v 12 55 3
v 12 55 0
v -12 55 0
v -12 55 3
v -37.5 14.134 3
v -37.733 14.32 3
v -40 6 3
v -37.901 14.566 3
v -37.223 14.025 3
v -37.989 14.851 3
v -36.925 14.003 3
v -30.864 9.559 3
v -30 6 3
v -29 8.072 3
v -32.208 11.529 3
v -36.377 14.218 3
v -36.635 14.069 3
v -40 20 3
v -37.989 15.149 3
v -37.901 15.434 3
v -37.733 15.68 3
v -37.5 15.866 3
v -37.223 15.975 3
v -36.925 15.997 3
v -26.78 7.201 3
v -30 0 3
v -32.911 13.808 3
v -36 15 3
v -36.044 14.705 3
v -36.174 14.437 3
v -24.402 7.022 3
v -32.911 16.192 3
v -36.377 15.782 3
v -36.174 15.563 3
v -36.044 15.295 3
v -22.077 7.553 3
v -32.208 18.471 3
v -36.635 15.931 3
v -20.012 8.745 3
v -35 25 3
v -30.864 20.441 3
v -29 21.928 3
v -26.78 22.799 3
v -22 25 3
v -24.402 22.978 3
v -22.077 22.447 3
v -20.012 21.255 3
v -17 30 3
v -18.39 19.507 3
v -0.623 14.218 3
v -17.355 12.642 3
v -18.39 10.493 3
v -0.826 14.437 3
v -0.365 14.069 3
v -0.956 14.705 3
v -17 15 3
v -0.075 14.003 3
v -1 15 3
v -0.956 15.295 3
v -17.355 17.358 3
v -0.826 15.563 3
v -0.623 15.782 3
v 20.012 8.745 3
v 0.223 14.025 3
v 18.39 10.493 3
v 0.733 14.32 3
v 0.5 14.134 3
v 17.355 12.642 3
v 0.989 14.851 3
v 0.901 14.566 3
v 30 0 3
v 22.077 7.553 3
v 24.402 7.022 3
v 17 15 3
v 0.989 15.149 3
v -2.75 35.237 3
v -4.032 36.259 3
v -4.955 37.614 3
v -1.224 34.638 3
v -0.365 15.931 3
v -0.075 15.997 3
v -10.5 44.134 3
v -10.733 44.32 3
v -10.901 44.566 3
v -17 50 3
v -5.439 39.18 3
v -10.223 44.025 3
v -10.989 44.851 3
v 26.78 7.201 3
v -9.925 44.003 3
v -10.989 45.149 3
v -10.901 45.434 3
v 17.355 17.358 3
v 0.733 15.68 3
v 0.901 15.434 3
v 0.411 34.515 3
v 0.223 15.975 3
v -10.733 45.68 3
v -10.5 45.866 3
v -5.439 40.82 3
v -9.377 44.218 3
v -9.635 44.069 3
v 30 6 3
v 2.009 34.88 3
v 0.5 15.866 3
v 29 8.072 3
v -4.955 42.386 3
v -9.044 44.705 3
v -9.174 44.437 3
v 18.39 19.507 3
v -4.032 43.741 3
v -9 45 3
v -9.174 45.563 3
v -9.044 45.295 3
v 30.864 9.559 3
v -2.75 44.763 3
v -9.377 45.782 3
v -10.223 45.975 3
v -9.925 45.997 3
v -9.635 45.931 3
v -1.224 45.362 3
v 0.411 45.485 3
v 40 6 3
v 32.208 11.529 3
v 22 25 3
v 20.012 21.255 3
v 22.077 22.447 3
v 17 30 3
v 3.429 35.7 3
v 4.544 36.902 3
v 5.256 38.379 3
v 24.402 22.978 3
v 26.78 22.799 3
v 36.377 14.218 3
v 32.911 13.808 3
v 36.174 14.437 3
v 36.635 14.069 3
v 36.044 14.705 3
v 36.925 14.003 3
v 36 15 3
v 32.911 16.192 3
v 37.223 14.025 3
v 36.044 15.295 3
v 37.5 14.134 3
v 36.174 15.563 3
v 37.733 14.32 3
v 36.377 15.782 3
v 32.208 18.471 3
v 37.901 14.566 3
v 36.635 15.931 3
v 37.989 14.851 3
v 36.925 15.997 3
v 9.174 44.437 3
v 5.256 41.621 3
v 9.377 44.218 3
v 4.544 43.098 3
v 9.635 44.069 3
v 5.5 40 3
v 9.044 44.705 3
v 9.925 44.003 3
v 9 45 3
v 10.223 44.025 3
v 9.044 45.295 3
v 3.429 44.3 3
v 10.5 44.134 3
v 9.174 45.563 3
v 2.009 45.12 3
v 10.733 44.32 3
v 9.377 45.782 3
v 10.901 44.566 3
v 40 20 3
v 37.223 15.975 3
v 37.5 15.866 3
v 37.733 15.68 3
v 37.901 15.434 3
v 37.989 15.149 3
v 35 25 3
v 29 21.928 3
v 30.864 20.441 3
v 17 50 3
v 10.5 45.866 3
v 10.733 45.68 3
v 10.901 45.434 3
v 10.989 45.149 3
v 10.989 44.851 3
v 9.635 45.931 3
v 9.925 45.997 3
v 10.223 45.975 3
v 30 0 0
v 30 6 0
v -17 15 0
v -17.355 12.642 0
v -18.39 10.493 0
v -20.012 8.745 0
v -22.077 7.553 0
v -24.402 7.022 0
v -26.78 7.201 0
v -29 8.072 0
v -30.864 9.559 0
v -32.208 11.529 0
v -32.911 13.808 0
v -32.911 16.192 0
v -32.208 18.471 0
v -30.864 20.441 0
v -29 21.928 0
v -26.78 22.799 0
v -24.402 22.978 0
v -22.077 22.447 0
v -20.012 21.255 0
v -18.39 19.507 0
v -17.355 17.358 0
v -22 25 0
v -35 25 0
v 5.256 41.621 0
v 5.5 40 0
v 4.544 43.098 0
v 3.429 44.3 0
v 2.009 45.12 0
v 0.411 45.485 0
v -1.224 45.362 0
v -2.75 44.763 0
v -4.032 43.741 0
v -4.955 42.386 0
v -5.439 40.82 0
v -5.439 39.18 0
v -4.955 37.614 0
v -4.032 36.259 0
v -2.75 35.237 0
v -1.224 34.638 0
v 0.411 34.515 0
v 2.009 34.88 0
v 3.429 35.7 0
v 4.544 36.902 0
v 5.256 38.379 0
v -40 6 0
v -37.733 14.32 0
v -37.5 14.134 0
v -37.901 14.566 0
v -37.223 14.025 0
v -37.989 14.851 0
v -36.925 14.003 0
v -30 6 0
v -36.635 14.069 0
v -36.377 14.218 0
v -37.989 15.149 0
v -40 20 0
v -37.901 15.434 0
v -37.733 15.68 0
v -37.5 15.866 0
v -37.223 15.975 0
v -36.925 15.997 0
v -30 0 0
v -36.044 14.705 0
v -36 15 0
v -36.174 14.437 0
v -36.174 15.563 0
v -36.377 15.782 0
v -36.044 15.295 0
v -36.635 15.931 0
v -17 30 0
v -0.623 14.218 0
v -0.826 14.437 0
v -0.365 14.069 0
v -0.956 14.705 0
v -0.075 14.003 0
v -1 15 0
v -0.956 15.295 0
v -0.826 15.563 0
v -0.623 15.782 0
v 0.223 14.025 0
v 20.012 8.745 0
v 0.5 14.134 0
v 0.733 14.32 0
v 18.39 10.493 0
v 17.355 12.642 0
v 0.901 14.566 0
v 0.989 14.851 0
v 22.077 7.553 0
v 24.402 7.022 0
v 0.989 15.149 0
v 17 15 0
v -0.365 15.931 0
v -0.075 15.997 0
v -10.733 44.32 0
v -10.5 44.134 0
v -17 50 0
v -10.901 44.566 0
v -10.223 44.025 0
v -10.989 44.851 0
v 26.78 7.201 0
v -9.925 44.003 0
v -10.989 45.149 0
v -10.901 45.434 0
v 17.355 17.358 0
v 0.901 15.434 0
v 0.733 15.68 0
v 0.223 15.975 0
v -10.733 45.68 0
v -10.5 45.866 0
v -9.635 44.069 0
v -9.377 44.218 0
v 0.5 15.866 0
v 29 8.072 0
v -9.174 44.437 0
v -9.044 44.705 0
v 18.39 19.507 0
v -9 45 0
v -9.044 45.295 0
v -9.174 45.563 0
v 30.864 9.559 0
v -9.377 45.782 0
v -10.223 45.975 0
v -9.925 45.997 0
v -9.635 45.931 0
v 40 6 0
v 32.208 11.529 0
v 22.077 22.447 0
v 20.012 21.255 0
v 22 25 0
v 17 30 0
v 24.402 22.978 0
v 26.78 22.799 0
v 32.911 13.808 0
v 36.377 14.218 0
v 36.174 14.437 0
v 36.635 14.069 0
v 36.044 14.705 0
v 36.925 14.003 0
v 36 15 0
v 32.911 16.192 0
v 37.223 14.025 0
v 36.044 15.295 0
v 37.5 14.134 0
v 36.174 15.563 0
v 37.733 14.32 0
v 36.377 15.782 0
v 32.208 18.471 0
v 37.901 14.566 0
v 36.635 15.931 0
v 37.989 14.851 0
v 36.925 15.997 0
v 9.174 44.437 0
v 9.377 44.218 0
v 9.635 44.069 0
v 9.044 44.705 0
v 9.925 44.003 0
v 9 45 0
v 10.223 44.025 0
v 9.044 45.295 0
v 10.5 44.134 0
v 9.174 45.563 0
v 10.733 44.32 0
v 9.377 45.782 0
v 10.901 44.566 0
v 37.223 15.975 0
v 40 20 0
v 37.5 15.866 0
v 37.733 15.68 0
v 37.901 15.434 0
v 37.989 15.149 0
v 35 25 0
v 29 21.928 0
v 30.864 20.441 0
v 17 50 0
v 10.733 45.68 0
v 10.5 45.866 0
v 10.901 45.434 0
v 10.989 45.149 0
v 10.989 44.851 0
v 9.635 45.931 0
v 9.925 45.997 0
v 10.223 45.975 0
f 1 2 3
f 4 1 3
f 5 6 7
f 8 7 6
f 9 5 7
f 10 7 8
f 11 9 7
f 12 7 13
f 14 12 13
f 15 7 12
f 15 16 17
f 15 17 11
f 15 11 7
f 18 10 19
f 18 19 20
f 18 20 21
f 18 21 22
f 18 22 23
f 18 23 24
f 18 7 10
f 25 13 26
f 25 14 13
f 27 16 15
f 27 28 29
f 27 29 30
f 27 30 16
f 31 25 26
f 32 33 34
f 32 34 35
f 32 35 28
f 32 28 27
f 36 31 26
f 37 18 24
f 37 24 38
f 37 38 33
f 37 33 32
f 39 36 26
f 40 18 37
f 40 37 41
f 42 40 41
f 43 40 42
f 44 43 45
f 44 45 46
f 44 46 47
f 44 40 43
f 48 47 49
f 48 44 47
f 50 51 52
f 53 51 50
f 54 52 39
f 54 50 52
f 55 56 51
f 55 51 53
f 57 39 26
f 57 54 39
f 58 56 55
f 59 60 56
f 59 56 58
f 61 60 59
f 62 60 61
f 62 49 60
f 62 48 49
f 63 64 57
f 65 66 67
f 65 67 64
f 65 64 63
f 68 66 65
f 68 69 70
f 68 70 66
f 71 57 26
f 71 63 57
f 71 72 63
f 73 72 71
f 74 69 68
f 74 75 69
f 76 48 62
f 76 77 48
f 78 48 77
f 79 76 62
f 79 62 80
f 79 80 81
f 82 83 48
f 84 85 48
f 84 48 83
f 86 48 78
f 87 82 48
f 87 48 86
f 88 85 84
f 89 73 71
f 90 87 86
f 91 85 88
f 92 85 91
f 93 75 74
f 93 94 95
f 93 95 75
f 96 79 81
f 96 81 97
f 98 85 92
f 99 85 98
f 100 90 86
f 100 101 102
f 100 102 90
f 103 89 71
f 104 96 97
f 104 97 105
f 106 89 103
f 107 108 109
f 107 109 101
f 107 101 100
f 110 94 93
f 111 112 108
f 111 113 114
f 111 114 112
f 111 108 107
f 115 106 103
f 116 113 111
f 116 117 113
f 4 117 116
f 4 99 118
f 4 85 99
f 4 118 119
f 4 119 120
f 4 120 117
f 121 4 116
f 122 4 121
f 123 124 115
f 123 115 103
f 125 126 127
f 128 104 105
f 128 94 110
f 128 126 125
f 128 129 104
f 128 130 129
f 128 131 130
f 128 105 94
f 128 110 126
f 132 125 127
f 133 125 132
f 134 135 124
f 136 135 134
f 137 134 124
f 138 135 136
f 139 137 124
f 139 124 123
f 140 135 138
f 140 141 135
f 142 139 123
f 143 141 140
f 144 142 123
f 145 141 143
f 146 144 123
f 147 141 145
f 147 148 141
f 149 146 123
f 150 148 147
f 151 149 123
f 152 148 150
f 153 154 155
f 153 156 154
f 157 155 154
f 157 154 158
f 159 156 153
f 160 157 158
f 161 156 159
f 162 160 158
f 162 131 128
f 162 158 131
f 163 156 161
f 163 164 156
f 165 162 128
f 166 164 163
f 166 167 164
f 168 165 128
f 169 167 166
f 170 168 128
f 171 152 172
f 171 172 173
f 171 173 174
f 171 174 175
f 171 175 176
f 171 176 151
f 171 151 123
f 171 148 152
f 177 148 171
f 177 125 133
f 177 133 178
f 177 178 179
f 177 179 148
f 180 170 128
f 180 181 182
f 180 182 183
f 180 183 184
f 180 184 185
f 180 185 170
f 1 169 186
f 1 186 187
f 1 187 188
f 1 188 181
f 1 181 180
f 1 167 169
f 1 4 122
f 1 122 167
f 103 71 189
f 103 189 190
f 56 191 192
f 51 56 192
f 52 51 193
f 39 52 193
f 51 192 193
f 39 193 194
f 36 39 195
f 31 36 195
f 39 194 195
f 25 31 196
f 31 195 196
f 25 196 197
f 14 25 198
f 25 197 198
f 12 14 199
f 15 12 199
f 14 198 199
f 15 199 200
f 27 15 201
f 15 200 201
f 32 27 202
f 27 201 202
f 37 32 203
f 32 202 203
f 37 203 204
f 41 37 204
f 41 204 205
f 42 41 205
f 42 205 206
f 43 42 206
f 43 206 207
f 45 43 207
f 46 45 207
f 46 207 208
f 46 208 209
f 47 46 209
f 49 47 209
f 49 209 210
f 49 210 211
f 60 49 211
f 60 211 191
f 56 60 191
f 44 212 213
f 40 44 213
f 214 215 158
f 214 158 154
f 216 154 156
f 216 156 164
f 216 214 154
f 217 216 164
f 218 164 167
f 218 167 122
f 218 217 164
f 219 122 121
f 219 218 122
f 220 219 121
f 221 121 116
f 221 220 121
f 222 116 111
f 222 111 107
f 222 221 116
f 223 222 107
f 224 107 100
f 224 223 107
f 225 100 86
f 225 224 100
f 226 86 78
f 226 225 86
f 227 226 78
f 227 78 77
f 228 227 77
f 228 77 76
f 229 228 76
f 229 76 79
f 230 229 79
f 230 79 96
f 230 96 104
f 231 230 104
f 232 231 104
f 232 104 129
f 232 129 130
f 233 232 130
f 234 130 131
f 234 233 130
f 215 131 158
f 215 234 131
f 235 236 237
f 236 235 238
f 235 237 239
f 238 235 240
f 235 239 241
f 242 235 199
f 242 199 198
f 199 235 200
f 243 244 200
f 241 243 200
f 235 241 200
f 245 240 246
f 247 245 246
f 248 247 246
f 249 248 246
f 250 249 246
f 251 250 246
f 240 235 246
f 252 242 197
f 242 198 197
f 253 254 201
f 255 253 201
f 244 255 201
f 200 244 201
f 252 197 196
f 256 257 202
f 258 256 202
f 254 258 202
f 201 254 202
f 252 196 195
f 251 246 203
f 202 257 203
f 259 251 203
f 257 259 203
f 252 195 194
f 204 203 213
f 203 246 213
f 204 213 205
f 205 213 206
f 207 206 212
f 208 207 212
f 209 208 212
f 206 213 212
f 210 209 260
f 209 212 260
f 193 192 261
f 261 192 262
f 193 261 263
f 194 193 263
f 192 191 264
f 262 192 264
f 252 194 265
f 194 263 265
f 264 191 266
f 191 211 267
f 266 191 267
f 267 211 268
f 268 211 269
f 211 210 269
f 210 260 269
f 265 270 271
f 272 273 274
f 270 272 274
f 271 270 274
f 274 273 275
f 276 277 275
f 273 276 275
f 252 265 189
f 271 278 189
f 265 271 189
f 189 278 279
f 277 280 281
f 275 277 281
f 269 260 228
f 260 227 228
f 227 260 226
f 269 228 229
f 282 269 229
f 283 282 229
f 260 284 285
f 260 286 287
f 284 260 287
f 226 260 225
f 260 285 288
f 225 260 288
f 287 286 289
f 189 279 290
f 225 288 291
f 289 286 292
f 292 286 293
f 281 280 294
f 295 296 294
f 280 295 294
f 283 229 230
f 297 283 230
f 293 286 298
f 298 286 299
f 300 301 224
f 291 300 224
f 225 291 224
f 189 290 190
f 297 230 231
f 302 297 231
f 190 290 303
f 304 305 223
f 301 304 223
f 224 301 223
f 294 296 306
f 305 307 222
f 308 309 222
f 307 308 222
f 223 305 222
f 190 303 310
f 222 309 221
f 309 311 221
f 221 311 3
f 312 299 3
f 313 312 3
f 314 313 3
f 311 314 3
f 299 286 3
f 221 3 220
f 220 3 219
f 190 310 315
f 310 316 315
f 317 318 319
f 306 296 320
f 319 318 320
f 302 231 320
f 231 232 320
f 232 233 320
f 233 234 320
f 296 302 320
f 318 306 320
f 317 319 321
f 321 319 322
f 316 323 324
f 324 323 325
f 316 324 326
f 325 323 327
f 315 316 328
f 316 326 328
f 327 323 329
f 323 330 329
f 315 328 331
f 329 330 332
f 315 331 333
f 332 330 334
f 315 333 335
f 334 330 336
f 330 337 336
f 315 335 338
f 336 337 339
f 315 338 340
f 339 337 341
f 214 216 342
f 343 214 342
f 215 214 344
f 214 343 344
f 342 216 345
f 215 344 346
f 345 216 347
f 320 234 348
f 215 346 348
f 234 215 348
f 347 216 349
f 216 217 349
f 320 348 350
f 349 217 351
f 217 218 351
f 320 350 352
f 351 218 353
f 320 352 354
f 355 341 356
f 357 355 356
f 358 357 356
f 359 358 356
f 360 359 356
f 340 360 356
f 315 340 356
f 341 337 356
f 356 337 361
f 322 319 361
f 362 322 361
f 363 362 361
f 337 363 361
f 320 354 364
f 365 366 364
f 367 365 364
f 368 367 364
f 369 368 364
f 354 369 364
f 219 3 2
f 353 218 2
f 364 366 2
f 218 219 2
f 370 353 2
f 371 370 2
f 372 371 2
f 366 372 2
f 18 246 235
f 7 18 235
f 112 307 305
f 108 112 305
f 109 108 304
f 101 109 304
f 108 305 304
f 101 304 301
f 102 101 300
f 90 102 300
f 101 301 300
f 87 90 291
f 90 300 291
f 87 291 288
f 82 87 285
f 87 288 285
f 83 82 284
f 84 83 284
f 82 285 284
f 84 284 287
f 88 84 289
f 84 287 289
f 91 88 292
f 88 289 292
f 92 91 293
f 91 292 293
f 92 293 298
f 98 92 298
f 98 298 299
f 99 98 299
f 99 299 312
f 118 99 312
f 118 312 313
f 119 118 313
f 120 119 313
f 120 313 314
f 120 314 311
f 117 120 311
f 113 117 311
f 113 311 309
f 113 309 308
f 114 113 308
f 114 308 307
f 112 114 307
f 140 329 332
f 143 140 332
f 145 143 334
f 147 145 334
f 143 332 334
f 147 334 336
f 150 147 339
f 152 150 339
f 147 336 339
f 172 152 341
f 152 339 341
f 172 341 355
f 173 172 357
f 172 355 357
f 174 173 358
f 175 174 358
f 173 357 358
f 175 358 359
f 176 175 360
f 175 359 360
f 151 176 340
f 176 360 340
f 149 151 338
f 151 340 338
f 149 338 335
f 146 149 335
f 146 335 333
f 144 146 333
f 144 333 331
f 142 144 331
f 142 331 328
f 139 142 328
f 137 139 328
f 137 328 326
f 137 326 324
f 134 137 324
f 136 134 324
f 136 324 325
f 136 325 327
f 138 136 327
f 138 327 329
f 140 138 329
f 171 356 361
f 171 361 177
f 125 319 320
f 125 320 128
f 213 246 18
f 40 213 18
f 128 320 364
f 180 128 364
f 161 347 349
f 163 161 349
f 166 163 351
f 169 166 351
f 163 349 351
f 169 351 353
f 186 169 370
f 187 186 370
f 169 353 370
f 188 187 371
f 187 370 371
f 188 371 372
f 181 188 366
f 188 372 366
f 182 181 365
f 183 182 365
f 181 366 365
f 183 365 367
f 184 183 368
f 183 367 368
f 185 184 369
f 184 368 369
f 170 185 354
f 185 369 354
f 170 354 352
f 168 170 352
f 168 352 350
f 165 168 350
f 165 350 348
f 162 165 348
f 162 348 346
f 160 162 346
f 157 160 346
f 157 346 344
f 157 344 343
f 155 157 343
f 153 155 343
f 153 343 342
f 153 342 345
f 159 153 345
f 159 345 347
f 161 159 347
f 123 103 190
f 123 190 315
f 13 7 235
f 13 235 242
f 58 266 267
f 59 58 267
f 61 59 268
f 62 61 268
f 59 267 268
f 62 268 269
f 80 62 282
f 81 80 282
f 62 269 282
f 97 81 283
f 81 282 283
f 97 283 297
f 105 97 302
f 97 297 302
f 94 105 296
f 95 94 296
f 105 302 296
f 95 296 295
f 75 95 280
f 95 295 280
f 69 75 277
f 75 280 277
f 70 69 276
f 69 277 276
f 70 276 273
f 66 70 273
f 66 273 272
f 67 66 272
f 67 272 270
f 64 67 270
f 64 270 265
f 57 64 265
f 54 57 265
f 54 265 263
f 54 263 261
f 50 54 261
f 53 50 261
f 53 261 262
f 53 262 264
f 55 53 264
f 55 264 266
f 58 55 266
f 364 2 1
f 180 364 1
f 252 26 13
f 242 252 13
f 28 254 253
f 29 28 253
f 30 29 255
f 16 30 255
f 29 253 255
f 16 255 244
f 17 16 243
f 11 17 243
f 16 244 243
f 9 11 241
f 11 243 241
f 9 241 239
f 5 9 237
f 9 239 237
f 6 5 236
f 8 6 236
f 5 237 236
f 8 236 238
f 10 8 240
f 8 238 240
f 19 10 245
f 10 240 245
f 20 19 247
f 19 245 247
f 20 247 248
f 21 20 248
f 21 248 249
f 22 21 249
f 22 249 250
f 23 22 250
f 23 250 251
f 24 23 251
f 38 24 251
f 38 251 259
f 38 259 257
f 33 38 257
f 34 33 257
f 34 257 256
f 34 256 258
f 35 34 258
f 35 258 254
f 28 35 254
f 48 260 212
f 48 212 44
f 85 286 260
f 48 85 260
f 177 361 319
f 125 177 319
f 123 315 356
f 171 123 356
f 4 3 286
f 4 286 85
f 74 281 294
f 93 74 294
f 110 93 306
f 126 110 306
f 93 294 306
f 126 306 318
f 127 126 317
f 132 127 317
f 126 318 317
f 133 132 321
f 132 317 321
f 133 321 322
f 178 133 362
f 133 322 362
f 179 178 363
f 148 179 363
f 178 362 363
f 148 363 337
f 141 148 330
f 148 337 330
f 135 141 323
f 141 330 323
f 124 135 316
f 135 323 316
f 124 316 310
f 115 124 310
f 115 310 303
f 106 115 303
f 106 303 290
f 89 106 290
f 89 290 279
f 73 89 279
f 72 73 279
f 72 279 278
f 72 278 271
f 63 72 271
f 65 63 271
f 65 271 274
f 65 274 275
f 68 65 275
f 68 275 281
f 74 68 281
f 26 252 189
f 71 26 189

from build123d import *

# Parameters (mm, degrees)
ESQUISSE1_R             = 13
BOSS_EXTRU_1_DEPTH      = 12
BOSS_EXTRU_2_START      = -12
ESQUISSE2_R             = 13
ESQUISSE2_R_2           = 5.5
BOSS_EXTRU_2_DEPTH      = 3
ESQUISSE4_R             = 8
ENL_V_MAT_EXTRU_2_DEPTH = 6
ESQUISSE5_R             = 3
ENL_V_MAT_EXTRU_3_DEPTH = 69.271516755
ESQUISSE6_W             = 10
ESQUISSE6_H             = 6
ENL_V_MAT_EXTRU_4_DEPTH = 12
CHANFREIN1_SIZE         = 5
ESQUISSE7_R             = 1
ENL_V_MAT_EXTRU_5_DEPTH = 12
ESQUISSE8_W             = 80
ESQUISSE8_H             = 9
ENL_V_MAT_EXTRU_6_DEPTH = 70.057946682


with BuildPart() as part:
    # Esquisse1 → Boss.-Extru.1 (new body)
    with BuildSketch(Plane.XY):
        Polygon((-40, 0), (40, 0), (40, 25), (17, 25), (17, 55), (-17, 55), (-17, 25), (-40, 25), align=None)
        with Locations((0, 40)):
            Circle(ESQUISSE1_R, mode=Mode.SUBTRACT)
    extrude(amount=BOSS_EXTRU_1_DEPTH)

    # Esquisse2 → Boss.-Extru.2 (add)
    with BuildSketch(Plane.XY.offset(12).offset(BOSS_EXTRU_2_START)):
        with Locations((0, 40)):
            Circle(ESQUISSE2_R)
        with Locations((0, 40)):
            Circle(ESQUISSE2_R_2, mode=Mode.SUBTRACT)
    extrude(amount=BOSS_EXTRU_2_DEPTH)

    # Esquisse4 → Enlèv. mat.-Extru.2 (cut)
    with BuildSketch(Plane(origin=(0, 0, 0), x_dir=(-1, 0, 0), z_dir=(0, 0, -1))):
        with Locations((-25, 15)):
            Circle(ESQUISSE4_R)
        with Locations(Location((25, 15, 0), (0, 0, 180))):
            Circle(ESQUISSE4_R)
    extrude(amount=-ENL_V_MAT_EXTRU_2_DEPTH, mode=Mode.SUBTRACT)

    # Esquisse5 → Enlèv. mat.-Extru.3 (cut, through all)
    with BuildSketch(Plane(origin=(0, 0, 6), x_dir=(-1, 0, 0), z_dir=(0, 0, -1))):
        with Locations((-25, 15)):
            Circle(ESQUISSE5_R)
        with Locations(Location((25, 15, 0), (0, 0, 180))):
            Circle(ESQUISSE5_R)
    extrude(amount=-ENL_V_MAT_EXTRU_3_DEPTH, mode=Mode.SUBTRACT)

    # Esquisse6 → Enlèv. mat.-Extru.4 (cut)
    with BuildSketch(Plane.XY.offset(12)):
        with Locations((35, 3)):
            Rectangle(ESQUISSE6_W, ESQUISSE6_H)
        with Locations((-35, 3)):
            Rectangle(ESQUISSE6_W, ESQUISSE6_H)
    extrude(amount=-ENL_V_MAT_EXTRU_4_DEPTH, mode=Mode.SUBTRACT)

    # Chanfrein1
    chanfrein1_edges = [part.edges().sort_by_distance(p)[0] for p in [
        (-17, 55, 6),
        (17, 55, 6),
        (17, 25, 6),
        (40, 25, 6),
        (-40, 25, 6),
        (-17, 25, 6),
    ]]
    chamfer(chanfrein1_edges, length=CHANFREIN1_SIZE)

    # Esquisse7 → Enlèv. mat.-Extru.5 (cut)
    with BuildSketch(Plane(origin=(0, 0, 0), x_dir=(-1, 0, 0), z_dir=(0, 0, -1))):
        with Locations((-10, 45)):
            Circle(ESQUISSE7_R)
        with Locations(Location((10, 45, 0), (0, 0, 180))):
            Circle(ESQUISSE7_R)
        with Locations((-37, 15)):
            Circle(ESQUISSE7_R)
        with Locations(Location((37, 15, 0), (0, 0, 180))):
            Circle(ESQUISSE7_R)
        with Locations((0, 15)):
            Circle(ESQUISSE7_R)
    extrude(amount=-ENL_V_MAT_EXTRU_5_DEPTH, mode=Mode.SUBTRACT)

    # Esquisse8 → Enlèv. mat.-Extru.6 (cut, through all)
    with BuildSketch(Plane(origin=(0, 55, 0), x_dir=(1, 0, 0), z_dir=(0, 1, 0))):
        with Locations((0, -7.5)):
            Rectangle(ESQUISSE8_W, ESQUISSE8_H)
    extrude(amount=-ENL_V_MAT_EXTRU_6_DEPTH, mode=Mode.SUBTRACT)


solid = part.part
